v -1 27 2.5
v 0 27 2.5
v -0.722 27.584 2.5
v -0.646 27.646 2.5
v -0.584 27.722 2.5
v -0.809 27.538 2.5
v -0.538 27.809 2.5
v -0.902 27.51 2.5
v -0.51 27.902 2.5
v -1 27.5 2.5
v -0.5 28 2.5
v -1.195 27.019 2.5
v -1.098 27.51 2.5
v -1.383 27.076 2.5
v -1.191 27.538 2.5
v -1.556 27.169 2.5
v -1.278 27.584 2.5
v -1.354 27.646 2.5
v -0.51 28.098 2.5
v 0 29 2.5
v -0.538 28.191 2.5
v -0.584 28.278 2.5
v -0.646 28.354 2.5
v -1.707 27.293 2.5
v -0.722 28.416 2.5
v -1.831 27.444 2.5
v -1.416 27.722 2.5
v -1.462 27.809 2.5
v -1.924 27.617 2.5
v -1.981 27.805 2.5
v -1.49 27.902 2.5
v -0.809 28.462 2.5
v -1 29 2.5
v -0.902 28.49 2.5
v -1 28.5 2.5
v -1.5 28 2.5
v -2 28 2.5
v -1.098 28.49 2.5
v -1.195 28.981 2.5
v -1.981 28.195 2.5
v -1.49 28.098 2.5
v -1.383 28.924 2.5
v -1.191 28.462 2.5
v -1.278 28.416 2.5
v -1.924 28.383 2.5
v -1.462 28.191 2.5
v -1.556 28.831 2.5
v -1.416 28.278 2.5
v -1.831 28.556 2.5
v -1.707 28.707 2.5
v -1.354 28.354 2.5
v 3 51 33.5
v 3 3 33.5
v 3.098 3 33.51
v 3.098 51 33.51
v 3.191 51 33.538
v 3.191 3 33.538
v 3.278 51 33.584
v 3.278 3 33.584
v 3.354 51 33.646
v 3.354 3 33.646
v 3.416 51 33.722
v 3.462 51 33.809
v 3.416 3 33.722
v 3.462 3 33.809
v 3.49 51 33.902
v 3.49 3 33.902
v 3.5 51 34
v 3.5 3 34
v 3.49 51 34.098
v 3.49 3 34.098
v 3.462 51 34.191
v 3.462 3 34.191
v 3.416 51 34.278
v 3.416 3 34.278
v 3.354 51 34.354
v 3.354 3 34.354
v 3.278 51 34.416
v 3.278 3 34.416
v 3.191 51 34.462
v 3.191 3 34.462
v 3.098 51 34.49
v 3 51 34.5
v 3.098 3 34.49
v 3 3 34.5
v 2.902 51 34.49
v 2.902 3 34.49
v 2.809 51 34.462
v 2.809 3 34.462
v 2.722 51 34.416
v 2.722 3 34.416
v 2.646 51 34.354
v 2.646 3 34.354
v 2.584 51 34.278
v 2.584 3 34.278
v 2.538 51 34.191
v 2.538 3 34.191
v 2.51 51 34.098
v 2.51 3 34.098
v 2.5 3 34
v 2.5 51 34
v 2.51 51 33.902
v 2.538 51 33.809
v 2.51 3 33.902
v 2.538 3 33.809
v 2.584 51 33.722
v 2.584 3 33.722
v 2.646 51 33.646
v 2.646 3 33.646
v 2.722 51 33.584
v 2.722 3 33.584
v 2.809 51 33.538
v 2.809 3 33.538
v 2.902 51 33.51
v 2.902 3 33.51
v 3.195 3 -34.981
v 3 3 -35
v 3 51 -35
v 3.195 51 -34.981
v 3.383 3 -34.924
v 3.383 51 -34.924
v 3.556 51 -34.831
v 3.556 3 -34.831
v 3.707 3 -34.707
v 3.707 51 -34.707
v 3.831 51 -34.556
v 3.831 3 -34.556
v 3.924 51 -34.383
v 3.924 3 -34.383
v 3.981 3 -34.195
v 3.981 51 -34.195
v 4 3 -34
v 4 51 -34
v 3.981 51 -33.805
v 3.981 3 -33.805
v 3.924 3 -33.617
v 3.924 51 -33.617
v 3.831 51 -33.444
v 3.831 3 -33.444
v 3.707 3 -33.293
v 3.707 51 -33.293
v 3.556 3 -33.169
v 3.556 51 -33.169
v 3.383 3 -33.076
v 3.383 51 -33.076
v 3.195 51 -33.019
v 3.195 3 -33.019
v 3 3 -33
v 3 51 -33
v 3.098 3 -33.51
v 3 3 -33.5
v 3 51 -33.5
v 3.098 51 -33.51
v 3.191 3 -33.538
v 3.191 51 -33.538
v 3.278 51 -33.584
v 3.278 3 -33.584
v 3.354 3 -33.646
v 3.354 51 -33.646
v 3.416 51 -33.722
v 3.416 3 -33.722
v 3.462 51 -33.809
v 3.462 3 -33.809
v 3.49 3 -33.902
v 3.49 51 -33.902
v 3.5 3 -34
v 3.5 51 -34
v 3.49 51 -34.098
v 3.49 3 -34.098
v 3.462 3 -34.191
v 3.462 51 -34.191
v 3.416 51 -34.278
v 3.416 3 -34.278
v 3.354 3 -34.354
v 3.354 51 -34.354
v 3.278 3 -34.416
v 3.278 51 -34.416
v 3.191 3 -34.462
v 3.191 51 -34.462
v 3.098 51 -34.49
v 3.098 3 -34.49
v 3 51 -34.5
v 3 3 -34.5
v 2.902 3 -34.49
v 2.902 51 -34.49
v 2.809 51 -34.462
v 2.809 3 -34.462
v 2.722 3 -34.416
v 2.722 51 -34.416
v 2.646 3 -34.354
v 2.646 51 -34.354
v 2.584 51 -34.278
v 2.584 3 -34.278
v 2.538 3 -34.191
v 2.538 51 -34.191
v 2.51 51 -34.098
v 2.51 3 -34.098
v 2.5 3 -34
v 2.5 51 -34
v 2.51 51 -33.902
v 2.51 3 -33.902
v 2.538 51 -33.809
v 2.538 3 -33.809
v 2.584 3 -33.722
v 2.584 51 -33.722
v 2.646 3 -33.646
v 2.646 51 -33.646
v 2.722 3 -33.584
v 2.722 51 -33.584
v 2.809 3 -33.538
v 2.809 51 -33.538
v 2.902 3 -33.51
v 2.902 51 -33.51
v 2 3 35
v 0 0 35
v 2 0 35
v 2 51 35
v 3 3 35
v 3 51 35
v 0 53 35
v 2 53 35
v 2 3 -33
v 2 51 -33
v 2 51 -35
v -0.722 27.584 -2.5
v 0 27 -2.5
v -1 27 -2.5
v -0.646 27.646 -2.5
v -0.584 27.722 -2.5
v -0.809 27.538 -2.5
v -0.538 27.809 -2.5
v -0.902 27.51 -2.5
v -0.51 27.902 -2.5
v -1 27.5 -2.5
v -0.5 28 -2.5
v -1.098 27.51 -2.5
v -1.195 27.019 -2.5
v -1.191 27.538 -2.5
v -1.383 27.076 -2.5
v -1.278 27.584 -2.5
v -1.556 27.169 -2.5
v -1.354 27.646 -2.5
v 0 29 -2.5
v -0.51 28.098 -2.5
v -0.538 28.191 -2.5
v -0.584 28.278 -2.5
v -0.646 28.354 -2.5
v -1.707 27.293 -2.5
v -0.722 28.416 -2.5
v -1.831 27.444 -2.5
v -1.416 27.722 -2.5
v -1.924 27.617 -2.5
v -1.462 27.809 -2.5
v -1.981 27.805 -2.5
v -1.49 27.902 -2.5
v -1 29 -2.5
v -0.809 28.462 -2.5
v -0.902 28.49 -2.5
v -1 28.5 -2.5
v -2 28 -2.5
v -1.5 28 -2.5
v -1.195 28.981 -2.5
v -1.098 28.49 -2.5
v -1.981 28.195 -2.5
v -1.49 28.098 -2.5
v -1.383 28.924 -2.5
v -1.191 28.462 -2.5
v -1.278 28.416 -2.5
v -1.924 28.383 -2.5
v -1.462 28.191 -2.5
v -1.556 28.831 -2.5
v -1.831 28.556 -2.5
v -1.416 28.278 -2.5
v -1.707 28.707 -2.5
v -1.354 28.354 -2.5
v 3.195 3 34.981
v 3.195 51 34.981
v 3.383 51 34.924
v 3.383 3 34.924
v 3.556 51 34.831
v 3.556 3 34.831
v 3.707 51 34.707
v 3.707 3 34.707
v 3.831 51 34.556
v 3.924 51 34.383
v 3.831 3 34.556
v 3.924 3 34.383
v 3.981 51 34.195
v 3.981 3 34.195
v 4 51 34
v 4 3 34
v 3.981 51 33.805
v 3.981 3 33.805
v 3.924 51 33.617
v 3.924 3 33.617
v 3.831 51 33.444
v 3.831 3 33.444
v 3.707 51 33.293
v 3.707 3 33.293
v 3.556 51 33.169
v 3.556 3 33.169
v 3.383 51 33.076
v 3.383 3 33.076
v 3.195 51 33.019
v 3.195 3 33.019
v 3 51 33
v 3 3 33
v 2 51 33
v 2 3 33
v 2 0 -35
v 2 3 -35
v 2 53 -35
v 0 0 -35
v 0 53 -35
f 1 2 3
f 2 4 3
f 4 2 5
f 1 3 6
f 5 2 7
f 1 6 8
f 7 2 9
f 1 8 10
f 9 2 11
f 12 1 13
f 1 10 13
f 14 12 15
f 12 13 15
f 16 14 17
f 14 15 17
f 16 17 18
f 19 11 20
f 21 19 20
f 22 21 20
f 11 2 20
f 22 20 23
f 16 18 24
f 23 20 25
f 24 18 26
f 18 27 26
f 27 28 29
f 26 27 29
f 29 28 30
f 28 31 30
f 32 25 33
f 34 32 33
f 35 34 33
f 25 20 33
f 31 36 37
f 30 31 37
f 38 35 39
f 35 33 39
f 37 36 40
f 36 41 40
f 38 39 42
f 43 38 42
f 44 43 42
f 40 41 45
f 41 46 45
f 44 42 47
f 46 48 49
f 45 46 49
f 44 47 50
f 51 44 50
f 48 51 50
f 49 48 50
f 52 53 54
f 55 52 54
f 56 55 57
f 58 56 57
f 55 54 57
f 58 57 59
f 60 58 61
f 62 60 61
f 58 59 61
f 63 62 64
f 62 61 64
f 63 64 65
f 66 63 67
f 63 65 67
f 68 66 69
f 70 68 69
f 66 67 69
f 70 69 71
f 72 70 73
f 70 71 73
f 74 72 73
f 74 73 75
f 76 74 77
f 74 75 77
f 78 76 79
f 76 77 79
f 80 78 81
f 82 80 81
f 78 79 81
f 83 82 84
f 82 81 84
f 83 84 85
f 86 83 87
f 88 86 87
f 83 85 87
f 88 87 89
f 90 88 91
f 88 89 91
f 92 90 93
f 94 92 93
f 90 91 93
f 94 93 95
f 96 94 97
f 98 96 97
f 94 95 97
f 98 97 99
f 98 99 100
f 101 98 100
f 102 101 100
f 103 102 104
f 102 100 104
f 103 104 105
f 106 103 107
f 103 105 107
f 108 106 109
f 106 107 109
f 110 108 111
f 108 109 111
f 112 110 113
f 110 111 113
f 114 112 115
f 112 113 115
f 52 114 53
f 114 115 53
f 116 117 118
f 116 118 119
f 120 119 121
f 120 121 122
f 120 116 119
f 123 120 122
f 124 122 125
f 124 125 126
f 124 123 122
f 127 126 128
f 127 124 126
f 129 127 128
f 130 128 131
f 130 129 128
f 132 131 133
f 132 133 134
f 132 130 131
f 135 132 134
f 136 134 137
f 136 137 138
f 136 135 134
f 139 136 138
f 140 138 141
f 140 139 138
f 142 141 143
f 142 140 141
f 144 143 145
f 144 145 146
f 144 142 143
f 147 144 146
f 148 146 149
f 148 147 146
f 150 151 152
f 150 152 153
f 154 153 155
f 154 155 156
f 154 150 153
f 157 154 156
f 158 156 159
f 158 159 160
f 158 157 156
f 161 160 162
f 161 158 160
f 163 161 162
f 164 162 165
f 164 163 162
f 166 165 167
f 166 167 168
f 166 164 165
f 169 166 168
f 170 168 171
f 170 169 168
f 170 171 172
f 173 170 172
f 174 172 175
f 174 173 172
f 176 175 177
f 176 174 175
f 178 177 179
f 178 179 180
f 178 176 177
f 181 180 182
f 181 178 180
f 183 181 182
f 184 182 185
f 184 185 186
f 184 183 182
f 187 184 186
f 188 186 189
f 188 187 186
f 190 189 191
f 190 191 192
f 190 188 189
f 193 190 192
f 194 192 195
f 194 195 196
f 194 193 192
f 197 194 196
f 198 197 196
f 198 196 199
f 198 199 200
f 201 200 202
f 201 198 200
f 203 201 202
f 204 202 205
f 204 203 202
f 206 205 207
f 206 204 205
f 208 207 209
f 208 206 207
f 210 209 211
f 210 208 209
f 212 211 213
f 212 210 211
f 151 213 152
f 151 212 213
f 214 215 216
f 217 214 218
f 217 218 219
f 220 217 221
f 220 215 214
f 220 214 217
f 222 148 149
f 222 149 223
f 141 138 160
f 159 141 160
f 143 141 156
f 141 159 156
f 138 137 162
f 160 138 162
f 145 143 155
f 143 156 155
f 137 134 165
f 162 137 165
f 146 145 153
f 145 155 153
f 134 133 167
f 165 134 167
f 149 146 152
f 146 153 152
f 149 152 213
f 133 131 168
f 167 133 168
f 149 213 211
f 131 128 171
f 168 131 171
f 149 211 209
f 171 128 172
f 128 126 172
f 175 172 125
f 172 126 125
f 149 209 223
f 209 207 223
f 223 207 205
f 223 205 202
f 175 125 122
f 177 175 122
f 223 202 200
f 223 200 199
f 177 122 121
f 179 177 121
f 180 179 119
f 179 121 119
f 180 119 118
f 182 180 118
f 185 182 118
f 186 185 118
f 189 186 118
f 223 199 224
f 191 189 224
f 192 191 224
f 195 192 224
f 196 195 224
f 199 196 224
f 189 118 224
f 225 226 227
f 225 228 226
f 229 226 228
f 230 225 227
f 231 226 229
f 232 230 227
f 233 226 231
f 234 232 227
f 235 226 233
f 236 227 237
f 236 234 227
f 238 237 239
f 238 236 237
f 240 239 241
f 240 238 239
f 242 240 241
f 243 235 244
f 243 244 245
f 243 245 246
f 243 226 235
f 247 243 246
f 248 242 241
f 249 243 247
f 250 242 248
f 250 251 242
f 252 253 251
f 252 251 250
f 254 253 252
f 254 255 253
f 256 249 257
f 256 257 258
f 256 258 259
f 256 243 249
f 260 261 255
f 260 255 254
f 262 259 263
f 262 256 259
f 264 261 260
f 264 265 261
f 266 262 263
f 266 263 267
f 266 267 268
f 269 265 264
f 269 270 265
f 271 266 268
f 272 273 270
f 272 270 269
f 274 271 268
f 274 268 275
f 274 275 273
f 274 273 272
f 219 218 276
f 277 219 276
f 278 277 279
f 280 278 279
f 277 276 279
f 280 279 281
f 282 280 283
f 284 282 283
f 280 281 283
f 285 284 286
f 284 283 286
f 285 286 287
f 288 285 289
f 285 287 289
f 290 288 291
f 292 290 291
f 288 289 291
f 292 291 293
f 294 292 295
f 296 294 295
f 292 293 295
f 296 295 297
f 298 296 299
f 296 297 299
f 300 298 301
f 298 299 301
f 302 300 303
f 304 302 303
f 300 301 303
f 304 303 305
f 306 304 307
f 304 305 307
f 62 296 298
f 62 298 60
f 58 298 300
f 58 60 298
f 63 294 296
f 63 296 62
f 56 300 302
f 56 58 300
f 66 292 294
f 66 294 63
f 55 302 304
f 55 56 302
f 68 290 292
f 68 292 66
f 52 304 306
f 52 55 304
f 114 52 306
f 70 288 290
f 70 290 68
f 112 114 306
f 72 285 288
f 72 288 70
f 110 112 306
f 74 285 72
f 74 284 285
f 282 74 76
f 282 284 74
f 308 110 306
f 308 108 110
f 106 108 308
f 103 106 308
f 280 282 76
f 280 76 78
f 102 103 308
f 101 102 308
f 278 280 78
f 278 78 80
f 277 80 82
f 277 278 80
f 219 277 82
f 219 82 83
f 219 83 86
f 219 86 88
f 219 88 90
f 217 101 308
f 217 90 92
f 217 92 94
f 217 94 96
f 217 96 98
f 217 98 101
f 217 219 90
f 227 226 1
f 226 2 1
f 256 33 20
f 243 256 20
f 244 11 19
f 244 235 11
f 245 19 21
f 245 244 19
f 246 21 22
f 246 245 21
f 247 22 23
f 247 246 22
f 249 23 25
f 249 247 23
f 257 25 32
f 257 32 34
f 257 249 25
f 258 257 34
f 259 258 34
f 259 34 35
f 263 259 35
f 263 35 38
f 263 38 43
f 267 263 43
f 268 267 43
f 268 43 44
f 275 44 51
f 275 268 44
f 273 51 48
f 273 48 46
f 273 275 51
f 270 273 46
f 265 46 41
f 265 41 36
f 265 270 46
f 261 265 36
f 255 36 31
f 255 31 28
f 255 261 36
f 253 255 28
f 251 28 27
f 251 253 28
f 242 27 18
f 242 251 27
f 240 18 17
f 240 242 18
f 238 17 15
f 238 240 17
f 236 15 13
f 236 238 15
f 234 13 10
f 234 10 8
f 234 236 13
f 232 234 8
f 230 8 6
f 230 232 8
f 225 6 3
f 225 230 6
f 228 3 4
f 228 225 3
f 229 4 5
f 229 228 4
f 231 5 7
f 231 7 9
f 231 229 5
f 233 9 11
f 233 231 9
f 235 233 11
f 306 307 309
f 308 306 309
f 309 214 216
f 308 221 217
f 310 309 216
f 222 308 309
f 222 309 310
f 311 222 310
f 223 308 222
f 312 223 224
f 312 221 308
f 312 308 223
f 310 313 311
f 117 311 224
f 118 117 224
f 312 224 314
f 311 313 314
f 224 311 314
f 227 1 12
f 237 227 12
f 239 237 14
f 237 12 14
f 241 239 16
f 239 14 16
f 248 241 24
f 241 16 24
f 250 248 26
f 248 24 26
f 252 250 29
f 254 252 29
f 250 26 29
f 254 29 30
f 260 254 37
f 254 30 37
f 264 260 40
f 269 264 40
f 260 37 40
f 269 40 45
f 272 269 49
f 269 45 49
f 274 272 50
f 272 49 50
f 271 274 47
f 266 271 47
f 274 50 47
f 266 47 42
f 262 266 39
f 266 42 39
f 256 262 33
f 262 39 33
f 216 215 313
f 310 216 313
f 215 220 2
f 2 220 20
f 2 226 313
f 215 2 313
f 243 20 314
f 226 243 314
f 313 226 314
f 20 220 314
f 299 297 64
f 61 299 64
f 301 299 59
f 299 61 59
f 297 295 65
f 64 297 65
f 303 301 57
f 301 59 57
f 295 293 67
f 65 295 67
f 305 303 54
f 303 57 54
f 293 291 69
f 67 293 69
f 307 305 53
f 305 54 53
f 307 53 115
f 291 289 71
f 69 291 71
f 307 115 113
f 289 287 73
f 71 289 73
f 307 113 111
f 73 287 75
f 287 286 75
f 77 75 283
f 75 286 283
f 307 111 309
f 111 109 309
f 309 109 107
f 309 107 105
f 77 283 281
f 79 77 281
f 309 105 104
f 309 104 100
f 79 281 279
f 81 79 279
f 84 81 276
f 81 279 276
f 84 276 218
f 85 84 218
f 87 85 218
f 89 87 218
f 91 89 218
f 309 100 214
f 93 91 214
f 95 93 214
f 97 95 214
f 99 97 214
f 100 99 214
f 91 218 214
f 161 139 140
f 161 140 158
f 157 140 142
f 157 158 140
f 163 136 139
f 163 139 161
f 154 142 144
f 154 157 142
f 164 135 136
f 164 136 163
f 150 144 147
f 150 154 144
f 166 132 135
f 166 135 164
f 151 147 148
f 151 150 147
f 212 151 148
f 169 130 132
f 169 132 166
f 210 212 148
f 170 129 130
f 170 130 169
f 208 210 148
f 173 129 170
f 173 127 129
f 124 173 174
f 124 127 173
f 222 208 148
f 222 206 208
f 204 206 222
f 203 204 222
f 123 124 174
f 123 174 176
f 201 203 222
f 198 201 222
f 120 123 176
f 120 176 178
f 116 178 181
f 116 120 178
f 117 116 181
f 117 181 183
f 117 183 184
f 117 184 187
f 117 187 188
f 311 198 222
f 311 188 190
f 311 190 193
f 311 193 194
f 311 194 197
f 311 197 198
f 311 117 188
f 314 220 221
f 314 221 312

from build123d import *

# Parameters (mm, degrees)
SKETCH_1_W      = 70
SKETCH_1_H      = 53
EXTRUDE_1_DEPTH = 2
EXTRUDE_START   = 3
SKETCH_2_R      = 0.5
EXTRUDE_2_DEPTH = 48
SKETCH_3_R      = 0.5
EXTRUDE_3_DEPTH = 2.5


with BuildPart() as part:
    # Эскиз1 → Бобышка-Вытянуть1 (new body)
    with BuildSketch(Plane(origin=(0, 0, 0), x_dir=(0, 0, -1), z_dir=(1, 0, 0))):
        with Locations((0, 26.5)):
            Rectangle(SKETCH_1_W, SKETCH_1_H)
    extrude(amount=EXTRUDE_1_DEPTH)

    # Эскиз2 → Бобышка-Вытянуть2 (add)
    with BuildSketch(Plane(origin=(0, 0, 0), x_dir=(1, 0, 0), z_dir=(0, 1, 0)).offset(EXTRUDE_START)):
        with BuildLine():
            Line((2, 35), (3, 35))
            ThreePointArc((3, 35), (4, 34), (3, 33))
            Line((3, 33), (2, 33))
            Line((2, 33), (2, 35))
        make_face()
        with Locations(Location((3, 34, 0), (0, 0, 270))):
            Circle(SKETCH_2_R, mode=Mode.SUBTRACT)
    extrude_2 = extrude(amount=EXTRUDE_2_DEPTH)

    # Зеркальное отражение1: Бобышка-Вытянуть2 across plane
    add(extrude_2.mirror(Plane.XY))

    # Эскиз3 → Бобышка-Вытянуть3 (add, symmetric)
    with BuildSketch(Plane.XY):
        with BuildLine():
            Line((-1, 29), (0, 29))
            Line((0, 29), (0, 27))
            Line((0, 27), (-1, 27))
            ThreePointArc((-1, 27), (-2, 28), (-1, 29))
        make_face()
        with Locations((-1, 28)):
            Circle(SKETCH_3_R, mode=Mode.SUBTRACT)
    extrude(amount=EXTRUDE_3_DEPTH, both=True)


solid = part.part
